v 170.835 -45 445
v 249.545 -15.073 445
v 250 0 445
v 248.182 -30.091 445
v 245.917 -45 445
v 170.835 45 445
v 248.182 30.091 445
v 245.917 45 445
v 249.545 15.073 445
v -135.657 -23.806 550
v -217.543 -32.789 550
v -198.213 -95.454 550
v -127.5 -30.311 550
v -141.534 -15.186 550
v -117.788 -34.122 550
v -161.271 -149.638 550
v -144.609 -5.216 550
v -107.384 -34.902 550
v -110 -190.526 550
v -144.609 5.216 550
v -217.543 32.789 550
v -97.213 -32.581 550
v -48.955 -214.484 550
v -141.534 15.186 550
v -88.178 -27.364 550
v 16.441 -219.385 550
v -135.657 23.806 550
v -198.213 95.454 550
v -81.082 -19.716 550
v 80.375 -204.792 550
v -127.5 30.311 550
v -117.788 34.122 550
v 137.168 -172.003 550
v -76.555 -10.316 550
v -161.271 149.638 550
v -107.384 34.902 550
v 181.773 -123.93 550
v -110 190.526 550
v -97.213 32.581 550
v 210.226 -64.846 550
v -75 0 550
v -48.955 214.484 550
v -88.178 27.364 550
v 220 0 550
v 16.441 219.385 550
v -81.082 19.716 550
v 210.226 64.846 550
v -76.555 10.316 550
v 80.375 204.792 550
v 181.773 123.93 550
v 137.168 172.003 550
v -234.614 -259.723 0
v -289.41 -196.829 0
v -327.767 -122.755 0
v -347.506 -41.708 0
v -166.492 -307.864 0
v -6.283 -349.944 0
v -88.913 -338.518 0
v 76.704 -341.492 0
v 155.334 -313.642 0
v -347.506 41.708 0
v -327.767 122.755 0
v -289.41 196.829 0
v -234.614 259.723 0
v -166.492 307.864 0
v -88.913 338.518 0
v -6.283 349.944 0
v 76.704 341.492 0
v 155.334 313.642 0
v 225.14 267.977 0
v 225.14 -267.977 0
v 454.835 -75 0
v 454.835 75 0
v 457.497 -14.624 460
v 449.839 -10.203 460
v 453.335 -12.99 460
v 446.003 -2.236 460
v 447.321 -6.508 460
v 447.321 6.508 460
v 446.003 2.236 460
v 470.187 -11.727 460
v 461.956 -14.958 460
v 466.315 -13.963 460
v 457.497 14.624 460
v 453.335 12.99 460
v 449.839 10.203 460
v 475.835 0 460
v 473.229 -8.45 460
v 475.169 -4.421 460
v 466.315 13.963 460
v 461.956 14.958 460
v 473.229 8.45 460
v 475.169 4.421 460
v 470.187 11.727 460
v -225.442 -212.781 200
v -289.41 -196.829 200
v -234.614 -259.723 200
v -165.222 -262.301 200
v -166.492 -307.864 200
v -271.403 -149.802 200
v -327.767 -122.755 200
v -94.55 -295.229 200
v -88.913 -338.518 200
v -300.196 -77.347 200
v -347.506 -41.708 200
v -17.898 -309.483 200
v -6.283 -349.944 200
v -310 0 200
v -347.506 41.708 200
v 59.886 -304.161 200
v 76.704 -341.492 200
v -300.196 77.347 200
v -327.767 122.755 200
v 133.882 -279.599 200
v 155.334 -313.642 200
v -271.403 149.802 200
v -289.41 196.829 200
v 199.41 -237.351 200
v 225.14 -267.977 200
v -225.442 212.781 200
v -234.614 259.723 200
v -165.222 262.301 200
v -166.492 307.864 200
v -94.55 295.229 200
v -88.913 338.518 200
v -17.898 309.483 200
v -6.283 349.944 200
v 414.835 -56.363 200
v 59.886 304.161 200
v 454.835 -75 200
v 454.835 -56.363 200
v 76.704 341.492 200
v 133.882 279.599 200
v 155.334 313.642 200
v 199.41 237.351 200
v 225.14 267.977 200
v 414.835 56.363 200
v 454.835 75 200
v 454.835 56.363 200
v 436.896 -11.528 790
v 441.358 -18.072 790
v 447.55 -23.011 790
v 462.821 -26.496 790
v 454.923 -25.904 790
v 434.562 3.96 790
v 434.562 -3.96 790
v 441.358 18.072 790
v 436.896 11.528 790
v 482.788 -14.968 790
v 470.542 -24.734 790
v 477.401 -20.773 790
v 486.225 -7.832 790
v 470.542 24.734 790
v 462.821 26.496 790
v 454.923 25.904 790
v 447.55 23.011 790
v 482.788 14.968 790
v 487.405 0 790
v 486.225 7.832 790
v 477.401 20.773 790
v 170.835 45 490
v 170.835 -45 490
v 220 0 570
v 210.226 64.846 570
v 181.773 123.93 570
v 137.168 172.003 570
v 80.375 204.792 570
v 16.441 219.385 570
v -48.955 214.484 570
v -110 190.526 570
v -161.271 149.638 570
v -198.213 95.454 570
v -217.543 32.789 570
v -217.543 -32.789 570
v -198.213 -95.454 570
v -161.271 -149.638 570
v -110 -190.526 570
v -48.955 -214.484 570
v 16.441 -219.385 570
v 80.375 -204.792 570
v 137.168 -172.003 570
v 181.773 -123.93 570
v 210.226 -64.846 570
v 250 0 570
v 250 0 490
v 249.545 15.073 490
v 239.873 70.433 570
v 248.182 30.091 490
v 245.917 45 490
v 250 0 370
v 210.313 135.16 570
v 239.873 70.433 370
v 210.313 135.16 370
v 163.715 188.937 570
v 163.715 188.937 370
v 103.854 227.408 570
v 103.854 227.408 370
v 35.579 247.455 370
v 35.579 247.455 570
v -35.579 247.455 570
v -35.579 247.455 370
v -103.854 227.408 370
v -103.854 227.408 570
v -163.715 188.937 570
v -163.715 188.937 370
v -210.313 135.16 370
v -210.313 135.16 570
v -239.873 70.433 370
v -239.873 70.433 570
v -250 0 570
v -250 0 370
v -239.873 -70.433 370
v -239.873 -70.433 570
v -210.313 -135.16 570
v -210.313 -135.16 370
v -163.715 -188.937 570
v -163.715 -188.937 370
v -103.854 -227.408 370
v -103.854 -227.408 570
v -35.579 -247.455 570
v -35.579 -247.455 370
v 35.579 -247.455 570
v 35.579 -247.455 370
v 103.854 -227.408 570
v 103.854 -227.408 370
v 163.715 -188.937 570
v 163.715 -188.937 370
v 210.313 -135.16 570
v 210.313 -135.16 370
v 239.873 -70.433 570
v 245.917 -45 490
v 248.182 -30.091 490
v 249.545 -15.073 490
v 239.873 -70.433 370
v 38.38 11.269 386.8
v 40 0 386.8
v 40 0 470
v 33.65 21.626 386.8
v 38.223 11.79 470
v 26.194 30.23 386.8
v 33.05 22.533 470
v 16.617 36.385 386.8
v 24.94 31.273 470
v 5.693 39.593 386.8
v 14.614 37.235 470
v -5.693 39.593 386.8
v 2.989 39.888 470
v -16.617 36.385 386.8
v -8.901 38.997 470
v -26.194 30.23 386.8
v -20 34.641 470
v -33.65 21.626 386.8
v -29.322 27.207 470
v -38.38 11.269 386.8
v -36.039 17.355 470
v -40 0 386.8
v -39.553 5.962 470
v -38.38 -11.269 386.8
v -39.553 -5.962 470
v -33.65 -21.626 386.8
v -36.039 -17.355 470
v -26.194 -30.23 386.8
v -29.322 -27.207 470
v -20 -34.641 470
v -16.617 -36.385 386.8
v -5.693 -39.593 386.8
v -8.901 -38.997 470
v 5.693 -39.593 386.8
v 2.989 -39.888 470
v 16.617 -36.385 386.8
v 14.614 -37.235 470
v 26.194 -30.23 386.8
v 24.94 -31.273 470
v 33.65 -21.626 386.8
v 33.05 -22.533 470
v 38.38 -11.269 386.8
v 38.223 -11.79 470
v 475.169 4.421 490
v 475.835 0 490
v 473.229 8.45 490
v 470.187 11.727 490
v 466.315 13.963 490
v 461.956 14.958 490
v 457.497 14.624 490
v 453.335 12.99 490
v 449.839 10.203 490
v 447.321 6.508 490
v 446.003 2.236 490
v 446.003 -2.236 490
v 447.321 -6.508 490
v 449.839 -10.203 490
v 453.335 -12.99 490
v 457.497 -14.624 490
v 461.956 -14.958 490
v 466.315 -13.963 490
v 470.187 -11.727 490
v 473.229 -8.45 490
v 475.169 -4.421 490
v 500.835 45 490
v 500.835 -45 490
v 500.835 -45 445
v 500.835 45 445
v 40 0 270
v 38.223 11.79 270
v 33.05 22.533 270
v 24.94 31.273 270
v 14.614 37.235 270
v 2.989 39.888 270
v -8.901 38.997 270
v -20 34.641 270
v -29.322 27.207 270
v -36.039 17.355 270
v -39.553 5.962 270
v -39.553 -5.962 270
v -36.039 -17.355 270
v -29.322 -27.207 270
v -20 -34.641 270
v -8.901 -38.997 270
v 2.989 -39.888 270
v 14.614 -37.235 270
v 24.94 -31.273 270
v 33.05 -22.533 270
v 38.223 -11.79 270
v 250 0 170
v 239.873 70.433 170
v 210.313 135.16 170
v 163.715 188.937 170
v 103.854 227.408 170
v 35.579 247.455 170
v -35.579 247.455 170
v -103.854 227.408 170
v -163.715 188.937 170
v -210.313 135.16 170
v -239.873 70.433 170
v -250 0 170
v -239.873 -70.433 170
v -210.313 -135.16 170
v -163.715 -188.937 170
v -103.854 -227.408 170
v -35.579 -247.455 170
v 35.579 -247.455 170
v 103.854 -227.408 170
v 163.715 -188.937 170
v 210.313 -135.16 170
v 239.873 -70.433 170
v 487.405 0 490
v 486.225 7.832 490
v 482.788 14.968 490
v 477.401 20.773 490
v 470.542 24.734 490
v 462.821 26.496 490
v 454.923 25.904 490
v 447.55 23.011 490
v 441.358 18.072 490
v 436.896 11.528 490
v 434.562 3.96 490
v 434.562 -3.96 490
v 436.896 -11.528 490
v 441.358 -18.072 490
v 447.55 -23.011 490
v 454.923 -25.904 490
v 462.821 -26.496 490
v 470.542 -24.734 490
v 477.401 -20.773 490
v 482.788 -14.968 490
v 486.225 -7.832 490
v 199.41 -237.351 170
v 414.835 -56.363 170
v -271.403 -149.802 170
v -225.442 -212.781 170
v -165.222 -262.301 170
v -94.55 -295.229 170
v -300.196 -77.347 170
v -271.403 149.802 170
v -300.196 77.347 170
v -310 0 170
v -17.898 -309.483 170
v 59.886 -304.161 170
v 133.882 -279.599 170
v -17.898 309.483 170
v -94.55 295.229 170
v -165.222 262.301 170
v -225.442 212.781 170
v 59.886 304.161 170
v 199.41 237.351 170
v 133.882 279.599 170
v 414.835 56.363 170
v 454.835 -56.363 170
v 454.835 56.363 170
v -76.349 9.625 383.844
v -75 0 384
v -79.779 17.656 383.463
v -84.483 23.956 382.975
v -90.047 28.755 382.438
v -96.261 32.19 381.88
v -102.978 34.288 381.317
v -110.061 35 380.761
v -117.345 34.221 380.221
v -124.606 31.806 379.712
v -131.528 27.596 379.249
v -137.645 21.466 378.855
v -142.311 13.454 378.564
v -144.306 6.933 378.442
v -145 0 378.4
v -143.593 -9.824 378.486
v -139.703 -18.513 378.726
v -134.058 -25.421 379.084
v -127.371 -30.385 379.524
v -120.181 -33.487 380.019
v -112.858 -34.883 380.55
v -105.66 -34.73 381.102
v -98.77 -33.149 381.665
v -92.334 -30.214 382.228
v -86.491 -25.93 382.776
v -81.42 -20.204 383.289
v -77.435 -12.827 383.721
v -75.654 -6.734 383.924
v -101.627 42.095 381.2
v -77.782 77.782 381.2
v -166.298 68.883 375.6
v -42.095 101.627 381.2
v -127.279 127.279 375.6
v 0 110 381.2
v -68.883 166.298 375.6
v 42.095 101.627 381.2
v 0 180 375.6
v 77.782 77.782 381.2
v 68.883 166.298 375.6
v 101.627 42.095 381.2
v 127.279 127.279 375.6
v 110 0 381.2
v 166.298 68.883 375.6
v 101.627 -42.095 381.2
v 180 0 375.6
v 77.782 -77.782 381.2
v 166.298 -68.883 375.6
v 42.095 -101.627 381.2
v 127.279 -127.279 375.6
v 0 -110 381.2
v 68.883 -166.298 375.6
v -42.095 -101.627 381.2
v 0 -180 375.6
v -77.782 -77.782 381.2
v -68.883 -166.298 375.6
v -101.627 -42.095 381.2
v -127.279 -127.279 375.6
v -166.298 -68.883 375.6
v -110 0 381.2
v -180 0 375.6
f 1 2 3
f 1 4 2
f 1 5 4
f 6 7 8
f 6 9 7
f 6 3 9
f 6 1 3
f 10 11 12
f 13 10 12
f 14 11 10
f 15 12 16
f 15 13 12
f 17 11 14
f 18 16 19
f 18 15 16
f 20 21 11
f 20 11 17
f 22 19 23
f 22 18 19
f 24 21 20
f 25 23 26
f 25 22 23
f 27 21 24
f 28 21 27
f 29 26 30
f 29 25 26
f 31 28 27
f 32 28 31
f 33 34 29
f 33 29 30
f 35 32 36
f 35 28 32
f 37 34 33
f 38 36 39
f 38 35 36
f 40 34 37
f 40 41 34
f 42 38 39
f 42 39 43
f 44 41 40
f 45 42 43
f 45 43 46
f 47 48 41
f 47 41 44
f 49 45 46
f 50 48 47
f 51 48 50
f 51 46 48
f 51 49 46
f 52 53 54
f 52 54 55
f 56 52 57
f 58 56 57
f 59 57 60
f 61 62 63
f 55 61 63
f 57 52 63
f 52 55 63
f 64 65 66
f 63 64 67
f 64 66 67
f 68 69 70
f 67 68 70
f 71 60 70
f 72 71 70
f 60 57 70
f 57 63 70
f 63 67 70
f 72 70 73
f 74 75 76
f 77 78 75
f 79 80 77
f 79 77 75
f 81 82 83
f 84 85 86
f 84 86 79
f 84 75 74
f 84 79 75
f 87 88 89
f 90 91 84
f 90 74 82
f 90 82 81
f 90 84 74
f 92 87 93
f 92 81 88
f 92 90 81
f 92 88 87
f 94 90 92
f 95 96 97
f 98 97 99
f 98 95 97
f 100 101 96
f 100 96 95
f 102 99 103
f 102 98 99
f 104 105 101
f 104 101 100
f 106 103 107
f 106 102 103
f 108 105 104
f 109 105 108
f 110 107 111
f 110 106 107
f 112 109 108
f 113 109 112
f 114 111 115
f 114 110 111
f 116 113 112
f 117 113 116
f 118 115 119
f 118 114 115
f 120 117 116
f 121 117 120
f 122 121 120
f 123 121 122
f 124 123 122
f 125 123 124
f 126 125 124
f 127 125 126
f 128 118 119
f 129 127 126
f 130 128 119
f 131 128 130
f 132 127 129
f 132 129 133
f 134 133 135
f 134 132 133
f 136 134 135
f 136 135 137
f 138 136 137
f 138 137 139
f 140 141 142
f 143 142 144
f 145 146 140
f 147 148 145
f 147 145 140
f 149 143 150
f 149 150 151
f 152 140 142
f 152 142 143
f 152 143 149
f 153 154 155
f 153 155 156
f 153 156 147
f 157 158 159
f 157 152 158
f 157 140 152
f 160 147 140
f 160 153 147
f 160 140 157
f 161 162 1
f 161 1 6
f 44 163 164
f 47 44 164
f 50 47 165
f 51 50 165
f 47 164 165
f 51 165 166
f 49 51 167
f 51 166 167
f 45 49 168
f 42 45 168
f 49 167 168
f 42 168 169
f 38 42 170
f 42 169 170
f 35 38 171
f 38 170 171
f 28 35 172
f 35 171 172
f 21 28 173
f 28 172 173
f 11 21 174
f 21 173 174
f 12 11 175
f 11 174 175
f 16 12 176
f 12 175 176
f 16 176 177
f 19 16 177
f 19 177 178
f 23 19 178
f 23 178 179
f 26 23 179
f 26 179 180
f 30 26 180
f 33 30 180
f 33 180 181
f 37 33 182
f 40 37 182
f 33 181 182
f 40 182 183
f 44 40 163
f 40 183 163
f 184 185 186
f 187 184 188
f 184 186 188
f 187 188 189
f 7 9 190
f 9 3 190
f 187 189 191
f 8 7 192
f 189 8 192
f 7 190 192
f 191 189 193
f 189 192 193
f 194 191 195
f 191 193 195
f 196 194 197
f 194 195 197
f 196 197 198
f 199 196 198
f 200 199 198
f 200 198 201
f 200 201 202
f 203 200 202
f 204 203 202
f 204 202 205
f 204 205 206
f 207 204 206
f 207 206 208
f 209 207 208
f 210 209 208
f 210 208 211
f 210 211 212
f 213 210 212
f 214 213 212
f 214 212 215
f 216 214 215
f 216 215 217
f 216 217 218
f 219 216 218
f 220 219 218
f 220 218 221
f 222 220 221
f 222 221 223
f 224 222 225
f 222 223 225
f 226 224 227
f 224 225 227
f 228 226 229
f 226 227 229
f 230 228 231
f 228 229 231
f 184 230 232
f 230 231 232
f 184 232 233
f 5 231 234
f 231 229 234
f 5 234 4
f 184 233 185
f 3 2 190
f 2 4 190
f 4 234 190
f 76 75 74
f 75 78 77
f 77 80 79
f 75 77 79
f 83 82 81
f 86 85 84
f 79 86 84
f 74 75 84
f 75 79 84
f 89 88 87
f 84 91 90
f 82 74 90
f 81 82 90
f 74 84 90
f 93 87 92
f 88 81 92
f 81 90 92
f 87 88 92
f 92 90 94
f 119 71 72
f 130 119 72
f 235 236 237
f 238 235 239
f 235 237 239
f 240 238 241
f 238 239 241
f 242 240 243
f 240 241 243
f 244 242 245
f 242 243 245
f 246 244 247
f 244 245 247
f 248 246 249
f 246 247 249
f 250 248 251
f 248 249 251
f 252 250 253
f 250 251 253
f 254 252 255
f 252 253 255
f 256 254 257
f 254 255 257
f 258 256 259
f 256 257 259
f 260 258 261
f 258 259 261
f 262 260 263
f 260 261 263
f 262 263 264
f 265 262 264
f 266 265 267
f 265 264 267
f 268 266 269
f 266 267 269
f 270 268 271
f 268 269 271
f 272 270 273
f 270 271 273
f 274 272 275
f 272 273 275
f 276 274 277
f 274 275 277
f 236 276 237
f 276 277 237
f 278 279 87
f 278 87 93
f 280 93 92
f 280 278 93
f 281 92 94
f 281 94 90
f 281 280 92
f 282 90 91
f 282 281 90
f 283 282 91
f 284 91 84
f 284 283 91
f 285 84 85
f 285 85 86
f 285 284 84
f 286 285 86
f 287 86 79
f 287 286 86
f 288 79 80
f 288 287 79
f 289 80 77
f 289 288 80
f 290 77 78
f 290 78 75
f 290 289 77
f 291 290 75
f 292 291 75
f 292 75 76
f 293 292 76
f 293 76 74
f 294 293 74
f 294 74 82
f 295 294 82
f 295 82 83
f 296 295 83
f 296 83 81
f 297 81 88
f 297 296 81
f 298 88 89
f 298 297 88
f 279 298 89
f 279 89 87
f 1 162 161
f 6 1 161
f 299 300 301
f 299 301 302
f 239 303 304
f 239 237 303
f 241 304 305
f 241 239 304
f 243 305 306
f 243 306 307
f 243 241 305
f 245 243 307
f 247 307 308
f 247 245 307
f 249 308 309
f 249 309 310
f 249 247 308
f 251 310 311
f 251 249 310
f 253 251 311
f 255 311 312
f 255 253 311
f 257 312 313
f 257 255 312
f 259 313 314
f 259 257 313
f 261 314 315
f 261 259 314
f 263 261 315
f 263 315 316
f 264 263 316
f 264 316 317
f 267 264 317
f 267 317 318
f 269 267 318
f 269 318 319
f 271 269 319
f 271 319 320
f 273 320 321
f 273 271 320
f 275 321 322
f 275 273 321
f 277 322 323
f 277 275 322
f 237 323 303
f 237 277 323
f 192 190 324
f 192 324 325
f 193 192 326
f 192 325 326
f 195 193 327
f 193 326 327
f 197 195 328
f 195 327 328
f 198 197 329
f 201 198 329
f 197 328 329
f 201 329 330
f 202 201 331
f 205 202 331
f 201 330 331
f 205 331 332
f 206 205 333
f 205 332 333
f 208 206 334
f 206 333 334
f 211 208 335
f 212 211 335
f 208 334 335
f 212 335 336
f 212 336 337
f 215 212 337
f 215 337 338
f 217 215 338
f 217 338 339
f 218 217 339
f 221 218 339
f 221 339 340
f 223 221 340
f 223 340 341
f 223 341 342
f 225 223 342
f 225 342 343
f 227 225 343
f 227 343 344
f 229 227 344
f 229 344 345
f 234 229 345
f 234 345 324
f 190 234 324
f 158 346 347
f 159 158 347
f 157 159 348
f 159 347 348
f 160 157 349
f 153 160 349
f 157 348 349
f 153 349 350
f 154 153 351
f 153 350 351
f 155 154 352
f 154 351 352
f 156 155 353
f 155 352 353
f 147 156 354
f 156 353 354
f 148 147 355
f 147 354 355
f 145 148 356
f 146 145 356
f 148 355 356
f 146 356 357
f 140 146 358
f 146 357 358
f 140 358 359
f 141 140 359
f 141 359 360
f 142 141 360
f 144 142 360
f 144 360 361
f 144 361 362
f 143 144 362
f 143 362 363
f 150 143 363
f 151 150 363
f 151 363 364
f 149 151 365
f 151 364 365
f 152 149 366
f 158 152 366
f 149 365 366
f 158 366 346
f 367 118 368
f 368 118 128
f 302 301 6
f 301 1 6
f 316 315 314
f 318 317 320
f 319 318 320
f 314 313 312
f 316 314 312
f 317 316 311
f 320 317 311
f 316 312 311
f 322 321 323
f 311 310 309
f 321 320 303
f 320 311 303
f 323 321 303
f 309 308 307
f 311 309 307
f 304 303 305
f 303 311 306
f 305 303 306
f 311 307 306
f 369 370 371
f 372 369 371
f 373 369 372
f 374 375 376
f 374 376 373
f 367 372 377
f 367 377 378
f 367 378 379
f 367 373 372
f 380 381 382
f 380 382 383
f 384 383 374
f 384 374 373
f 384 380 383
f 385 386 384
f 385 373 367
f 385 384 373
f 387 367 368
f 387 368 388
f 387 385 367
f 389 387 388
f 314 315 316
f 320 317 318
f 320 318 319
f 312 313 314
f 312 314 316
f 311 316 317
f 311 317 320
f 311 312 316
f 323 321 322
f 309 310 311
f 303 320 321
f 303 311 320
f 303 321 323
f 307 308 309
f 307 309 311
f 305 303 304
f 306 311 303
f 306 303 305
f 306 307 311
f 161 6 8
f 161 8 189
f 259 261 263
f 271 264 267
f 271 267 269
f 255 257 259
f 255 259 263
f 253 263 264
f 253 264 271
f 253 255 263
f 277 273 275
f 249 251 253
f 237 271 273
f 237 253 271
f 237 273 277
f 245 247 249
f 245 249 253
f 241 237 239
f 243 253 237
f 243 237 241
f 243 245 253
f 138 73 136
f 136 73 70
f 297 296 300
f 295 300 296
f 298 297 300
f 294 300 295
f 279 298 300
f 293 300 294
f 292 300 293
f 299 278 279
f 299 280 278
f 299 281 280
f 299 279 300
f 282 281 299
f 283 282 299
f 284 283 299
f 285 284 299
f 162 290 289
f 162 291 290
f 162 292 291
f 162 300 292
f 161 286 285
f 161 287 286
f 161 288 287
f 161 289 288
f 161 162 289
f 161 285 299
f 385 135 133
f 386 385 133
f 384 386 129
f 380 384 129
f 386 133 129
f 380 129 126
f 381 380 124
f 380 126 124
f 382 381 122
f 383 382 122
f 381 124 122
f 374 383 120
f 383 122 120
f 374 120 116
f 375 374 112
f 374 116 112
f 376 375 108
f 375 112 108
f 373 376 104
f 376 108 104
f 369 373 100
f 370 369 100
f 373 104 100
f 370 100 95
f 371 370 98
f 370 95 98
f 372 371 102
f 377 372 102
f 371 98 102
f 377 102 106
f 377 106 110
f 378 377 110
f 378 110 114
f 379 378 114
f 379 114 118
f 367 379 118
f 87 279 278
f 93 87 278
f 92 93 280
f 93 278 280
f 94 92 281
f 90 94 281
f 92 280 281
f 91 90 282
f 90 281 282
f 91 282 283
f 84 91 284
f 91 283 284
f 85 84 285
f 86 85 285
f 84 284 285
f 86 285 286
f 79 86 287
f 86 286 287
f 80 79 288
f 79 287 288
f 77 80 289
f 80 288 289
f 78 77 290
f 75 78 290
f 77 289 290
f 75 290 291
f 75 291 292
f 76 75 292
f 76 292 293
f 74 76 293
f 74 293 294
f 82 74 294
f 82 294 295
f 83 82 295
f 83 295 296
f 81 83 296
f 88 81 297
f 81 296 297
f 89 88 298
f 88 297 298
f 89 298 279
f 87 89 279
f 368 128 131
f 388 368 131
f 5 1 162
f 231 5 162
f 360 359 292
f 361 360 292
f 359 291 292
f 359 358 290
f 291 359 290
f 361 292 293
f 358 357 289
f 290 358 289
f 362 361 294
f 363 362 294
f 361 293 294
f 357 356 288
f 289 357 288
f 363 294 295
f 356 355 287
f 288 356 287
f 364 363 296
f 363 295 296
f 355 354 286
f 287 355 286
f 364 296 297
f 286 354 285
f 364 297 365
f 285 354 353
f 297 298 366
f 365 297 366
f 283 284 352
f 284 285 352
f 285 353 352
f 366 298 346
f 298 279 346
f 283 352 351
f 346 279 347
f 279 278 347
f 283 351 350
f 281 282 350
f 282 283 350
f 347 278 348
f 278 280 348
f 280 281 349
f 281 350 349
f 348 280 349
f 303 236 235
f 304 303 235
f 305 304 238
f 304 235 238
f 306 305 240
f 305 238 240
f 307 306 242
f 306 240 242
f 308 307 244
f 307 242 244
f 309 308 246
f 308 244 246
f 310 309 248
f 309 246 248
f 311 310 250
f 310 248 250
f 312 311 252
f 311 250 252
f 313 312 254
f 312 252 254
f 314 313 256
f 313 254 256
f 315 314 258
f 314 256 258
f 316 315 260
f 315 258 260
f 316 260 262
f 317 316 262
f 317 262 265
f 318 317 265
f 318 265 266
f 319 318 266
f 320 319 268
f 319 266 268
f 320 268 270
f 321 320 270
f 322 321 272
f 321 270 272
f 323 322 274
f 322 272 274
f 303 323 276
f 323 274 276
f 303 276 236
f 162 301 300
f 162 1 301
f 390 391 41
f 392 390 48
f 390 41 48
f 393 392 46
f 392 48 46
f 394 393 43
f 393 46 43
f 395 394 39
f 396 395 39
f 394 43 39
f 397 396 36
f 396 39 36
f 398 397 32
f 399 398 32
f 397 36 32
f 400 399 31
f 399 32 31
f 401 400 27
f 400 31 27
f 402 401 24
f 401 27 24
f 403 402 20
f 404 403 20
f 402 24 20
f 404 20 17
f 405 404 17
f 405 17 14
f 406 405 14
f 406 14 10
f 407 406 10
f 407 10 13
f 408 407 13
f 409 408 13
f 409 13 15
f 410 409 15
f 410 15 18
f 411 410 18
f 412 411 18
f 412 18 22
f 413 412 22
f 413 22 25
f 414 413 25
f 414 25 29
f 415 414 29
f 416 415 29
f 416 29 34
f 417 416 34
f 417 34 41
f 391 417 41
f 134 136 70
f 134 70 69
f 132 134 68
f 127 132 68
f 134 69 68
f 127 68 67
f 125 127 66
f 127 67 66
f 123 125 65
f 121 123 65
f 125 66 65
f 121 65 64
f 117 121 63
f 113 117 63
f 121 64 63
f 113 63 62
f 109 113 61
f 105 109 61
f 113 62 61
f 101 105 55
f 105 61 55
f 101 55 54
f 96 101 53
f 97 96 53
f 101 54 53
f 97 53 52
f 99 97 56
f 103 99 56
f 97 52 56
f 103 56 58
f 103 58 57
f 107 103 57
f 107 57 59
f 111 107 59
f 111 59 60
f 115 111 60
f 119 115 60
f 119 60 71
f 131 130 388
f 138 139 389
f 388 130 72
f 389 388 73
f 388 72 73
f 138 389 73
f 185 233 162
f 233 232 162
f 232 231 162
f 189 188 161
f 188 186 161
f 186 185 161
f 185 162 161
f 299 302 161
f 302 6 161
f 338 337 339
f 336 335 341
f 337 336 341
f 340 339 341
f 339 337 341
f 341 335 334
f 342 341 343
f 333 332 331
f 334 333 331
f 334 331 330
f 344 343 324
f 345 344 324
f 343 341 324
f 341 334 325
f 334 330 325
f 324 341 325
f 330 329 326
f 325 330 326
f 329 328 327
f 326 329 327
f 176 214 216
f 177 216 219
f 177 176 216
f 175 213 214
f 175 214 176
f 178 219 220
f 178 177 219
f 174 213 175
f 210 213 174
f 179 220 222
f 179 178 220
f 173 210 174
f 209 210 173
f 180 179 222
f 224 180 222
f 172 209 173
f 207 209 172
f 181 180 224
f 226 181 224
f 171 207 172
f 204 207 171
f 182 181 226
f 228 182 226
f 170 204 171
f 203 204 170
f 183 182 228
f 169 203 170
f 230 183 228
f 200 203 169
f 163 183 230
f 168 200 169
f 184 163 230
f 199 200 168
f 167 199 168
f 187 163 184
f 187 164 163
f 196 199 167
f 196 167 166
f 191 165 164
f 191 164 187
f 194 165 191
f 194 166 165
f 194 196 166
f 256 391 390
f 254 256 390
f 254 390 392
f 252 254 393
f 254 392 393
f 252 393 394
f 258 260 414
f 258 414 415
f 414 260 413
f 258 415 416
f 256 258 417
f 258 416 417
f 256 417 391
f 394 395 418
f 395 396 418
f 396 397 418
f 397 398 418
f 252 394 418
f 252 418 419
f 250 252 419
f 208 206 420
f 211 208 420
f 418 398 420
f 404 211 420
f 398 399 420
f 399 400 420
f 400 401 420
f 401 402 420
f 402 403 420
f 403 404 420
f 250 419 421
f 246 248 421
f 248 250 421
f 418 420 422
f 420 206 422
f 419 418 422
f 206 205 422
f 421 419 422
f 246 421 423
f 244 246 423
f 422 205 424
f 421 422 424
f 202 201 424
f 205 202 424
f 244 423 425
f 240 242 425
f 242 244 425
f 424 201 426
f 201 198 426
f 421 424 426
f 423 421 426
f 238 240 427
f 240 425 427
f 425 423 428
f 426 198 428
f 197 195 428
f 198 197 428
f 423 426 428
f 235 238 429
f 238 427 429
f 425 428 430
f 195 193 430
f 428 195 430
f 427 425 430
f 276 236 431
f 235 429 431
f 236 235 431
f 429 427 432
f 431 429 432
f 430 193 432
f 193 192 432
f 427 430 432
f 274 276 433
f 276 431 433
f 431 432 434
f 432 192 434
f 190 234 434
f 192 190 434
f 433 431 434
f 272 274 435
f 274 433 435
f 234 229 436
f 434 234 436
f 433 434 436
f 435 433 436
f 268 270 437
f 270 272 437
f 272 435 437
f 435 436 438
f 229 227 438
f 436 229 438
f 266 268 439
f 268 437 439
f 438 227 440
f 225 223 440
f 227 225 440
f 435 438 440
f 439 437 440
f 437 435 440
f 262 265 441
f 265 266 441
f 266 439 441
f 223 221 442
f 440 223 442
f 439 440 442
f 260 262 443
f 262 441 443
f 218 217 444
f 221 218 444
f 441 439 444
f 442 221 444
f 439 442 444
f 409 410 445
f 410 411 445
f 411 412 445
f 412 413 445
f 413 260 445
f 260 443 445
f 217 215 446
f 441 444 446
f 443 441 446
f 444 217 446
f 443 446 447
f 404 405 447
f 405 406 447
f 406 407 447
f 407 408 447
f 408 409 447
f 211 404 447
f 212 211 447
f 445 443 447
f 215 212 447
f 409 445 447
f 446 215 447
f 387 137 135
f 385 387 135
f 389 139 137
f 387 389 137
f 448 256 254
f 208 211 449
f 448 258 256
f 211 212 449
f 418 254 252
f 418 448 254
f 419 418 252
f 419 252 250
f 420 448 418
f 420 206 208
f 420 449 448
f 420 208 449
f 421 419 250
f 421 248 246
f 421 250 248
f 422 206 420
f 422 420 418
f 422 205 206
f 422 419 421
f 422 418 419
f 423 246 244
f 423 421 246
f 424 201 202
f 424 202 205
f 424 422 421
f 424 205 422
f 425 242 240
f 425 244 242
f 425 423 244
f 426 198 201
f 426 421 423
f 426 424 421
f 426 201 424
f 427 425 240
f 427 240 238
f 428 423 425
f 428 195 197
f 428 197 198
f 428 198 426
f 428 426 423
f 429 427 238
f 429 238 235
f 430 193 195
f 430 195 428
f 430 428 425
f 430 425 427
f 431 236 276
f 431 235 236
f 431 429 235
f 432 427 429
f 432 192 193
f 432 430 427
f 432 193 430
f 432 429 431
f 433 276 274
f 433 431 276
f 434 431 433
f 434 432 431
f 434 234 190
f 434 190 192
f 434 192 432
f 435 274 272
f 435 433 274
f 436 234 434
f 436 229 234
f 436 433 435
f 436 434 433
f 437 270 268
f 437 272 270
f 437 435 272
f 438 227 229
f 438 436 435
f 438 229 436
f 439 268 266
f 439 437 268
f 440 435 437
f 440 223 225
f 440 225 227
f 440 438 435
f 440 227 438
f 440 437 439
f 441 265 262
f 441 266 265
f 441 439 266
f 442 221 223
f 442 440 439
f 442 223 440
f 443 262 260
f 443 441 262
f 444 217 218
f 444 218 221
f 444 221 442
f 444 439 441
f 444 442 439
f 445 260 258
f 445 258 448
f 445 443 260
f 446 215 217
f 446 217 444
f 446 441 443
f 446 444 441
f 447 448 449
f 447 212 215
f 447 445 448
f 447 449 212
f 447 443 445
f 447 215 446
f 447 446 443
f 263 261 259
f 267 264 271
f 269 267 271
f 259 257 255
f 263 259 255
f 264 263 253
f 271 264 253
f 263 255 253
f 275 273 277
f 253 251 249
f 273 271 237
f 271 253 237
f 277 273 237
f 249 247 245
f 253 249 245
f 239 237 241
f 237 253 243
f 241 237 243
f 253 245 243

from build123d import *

# Parameters (mm, degrees)
F1_DEPTH  = 200
F3_DEPTH  = 30
F4_R      = 250
F5_DEPTH  = 200
F9_R      = 40
F10_DEPTH = 100
F11_R     = 250
F13_DEPTH = 200
F15_R     = 220
F16_DEPTH = 20
F17_R     = 35
F18_REACH = 648.9959493661
F21_DEPTH = 80
F22_W     = 90
F22_H     = 45
F23_DEPTH = 250
F24_R     = 15
F25_DEPTH = 30
F27_R     = 26.5702417315
F28_DEPTH = 300


with BuildPart() as f1:
    # F0 (on Top) → F1 (new body)
    with BuildSketch(Plane.XY):
        with BuildLine():
            ThreePointArc((225.1402542748, -267.977360807), (317.2531237011, -147.8189957411), (350, 0))
            ThreePointArc((350, 0), (317.2531237011, 147.8189957411), (225.1402542748, 267.977360807))
            ThreePointArc((225.1402542748, 267.977360807), (-350, 0), (225.1402542748, -267.977360807))
        make_face()
        with BuildLine():
            ThreePointArc((225.1402542748, 267.977360807), (317.2531237011, 147.8189957411), (350, 0))
            ThreePointArc((350, 0), (317.2531237011, -147.8189957411), (225.1402542748, -267.977360807))
            Line((225.1402542748, -267.977360807), (454.8351349665, -75))
            Line((454.8351349665, -75), (454.8351349665, 0))
            Line((454.8351349665, 0), (454.8351349665, 75))
            Line((454.8351349665, 75), (225.1402542748, 267.977360807))
        make_face()
    extrude(amount=F1_DEPTH)

    # F2 (on face) → F3 (cut)
    with BuildSketch(Plane.XY.offset(200)):
        with BuildLine():
            Line((414.8351349665, 56.3626426726), (199.4099395005, 237.3513767148))
            ThreePointArc((199.4099395005, 237.3513767148), (-310, 0), (199.4099395005, -237.3513767148))
            Line((199.4099395005, -237.3513767148), (414.8351349665, -56.3626426726))
            Line((414.8351349665, -56.3626426726), (454.8351349665, -56.3626426726))
            Line((454.8351349665, -56.3626426726), (454.8351349665, 56.3626426726))
            Line((454.8351349665, 56.3626426726), (414.8351349665, 56.3626426726))
        make_face()
    extrude(amount=-F3_DEPTH, mode=Mode.SUBTRACT)


with BuildPart() as f5:
    # F4 (on face) → F5 (new body)
    with BuildSketch(Plane.XY.offset(170)):
        Circle(F4_R)
    extrude(amount=F5_DEPTH)

    # F6 (on Front) → F7 (revolve)
    with BuildSketch(Plane.XZ):
        Polygon((0, 370), (0, 390), (-250, 370), align=None)
    revolve(axis=Axis((0, 0, 380), (0, 0, -1)))


with BuildPart() as f10:
    # F9 (on offset) → F10 (new body, symmetric)
    with BuildSketch(Plane.XY.offset(370)):
        Circle(F9_R)
    extrude(amount=F10_DEPTH, both=True)


with BuildPart() as f5_1:
    add(f5.part)

    # F12: cut F10
    add(f10.part, mode=Mode.SUBTRACT)


with BuildPart() as f13:
    # F11 (on offset) → F13 (new body)
    with BuildSketch(Plane.XY.offset(370)):
        Circle(F11_R)
    extrude(amount=F13_DEPTH)

    # F14: cut F10, F5
    add(f10.part, mode=Mode.SUBTRACT)
    add(f5_1.part, mode=Mode.SUBTRACT)

    # F15 (on face) → F16 (cut)
    with BuildSketch(Plane.XY.offset(570)):
        Circle(F15_R)
    extrude(amount=-F16_DEPTH, mode=Mode.SUBTRACT)

    f18_end = f5_1.part.faces().sort_by_distance((145, 0, 378.4))[0]
    # F17 (on face) → F18 (cut, up to a face of F5 that its end follows)
    with BuildSketch(Plane.XY.offset(550)):
        with Locations((-110, 0)):
            Circle(F17_R)
    f18_long = extrude(amount=-F18_REACH, mode=Mode.PRIVATE)
    add(split(f18_long, bisect_by=f18_end, keep=Keep.TOP, mode=Mode.PRIVATE), mode=Mode.SUBTRACT)


with BuildPart() as f21:
    # F20 (on offset) → F21 (new body)
    with BuildSketch(Plane.YZ.offset(250.8351349665)):
        Polygon((0, 490), (-45, 490), (-45, 445), (0, 445), (45, 445), (45, 490), align=None)
    extrude(amount=-F21_DEPTH)

    # F22 (on face) → F23 (join)
    with BuildSketch(Plane.YZ.offset(250.8351349665)):
        with Locations((0, 467.5)):
            Rectangle(F22_W, F22_H)
    extrude(amount=F23_DEPTH)


with BuildPart() as f25:
    # F24 (on face) → F25 (new body)
    with BuildSketch(Plane.XY.offset(490)):
        with Locations((460.8351349665, 0)):
            Circle(F24_R)
    extrude(amount=-F25_DEPTH)


with BuildPart() as f21_1:
    add(f21.part)

    # F26: cut F25
    add(f25.part, mode=Mode.SUBTRACT)


with BuildPart() as f25_1:
    add(f25.part)

    # F27 (on face) → F28 (join)
    with BuildSketch(Plane.XY.offset(490)):
        with Locations((460.8351349665, 0)):
            Circle(F27_R)
    extrude(amount=F28_DEPTH)


with BuildPart() as f13_1:
    add(f13.part)

    # F29: cut F21
    add(f21_1.part, mode=Mode.SUBTRACT)


solid = Compound([f1.part, f10.part, f5_1.part, f21_1.part, f25_1.part, f13_1.part])
